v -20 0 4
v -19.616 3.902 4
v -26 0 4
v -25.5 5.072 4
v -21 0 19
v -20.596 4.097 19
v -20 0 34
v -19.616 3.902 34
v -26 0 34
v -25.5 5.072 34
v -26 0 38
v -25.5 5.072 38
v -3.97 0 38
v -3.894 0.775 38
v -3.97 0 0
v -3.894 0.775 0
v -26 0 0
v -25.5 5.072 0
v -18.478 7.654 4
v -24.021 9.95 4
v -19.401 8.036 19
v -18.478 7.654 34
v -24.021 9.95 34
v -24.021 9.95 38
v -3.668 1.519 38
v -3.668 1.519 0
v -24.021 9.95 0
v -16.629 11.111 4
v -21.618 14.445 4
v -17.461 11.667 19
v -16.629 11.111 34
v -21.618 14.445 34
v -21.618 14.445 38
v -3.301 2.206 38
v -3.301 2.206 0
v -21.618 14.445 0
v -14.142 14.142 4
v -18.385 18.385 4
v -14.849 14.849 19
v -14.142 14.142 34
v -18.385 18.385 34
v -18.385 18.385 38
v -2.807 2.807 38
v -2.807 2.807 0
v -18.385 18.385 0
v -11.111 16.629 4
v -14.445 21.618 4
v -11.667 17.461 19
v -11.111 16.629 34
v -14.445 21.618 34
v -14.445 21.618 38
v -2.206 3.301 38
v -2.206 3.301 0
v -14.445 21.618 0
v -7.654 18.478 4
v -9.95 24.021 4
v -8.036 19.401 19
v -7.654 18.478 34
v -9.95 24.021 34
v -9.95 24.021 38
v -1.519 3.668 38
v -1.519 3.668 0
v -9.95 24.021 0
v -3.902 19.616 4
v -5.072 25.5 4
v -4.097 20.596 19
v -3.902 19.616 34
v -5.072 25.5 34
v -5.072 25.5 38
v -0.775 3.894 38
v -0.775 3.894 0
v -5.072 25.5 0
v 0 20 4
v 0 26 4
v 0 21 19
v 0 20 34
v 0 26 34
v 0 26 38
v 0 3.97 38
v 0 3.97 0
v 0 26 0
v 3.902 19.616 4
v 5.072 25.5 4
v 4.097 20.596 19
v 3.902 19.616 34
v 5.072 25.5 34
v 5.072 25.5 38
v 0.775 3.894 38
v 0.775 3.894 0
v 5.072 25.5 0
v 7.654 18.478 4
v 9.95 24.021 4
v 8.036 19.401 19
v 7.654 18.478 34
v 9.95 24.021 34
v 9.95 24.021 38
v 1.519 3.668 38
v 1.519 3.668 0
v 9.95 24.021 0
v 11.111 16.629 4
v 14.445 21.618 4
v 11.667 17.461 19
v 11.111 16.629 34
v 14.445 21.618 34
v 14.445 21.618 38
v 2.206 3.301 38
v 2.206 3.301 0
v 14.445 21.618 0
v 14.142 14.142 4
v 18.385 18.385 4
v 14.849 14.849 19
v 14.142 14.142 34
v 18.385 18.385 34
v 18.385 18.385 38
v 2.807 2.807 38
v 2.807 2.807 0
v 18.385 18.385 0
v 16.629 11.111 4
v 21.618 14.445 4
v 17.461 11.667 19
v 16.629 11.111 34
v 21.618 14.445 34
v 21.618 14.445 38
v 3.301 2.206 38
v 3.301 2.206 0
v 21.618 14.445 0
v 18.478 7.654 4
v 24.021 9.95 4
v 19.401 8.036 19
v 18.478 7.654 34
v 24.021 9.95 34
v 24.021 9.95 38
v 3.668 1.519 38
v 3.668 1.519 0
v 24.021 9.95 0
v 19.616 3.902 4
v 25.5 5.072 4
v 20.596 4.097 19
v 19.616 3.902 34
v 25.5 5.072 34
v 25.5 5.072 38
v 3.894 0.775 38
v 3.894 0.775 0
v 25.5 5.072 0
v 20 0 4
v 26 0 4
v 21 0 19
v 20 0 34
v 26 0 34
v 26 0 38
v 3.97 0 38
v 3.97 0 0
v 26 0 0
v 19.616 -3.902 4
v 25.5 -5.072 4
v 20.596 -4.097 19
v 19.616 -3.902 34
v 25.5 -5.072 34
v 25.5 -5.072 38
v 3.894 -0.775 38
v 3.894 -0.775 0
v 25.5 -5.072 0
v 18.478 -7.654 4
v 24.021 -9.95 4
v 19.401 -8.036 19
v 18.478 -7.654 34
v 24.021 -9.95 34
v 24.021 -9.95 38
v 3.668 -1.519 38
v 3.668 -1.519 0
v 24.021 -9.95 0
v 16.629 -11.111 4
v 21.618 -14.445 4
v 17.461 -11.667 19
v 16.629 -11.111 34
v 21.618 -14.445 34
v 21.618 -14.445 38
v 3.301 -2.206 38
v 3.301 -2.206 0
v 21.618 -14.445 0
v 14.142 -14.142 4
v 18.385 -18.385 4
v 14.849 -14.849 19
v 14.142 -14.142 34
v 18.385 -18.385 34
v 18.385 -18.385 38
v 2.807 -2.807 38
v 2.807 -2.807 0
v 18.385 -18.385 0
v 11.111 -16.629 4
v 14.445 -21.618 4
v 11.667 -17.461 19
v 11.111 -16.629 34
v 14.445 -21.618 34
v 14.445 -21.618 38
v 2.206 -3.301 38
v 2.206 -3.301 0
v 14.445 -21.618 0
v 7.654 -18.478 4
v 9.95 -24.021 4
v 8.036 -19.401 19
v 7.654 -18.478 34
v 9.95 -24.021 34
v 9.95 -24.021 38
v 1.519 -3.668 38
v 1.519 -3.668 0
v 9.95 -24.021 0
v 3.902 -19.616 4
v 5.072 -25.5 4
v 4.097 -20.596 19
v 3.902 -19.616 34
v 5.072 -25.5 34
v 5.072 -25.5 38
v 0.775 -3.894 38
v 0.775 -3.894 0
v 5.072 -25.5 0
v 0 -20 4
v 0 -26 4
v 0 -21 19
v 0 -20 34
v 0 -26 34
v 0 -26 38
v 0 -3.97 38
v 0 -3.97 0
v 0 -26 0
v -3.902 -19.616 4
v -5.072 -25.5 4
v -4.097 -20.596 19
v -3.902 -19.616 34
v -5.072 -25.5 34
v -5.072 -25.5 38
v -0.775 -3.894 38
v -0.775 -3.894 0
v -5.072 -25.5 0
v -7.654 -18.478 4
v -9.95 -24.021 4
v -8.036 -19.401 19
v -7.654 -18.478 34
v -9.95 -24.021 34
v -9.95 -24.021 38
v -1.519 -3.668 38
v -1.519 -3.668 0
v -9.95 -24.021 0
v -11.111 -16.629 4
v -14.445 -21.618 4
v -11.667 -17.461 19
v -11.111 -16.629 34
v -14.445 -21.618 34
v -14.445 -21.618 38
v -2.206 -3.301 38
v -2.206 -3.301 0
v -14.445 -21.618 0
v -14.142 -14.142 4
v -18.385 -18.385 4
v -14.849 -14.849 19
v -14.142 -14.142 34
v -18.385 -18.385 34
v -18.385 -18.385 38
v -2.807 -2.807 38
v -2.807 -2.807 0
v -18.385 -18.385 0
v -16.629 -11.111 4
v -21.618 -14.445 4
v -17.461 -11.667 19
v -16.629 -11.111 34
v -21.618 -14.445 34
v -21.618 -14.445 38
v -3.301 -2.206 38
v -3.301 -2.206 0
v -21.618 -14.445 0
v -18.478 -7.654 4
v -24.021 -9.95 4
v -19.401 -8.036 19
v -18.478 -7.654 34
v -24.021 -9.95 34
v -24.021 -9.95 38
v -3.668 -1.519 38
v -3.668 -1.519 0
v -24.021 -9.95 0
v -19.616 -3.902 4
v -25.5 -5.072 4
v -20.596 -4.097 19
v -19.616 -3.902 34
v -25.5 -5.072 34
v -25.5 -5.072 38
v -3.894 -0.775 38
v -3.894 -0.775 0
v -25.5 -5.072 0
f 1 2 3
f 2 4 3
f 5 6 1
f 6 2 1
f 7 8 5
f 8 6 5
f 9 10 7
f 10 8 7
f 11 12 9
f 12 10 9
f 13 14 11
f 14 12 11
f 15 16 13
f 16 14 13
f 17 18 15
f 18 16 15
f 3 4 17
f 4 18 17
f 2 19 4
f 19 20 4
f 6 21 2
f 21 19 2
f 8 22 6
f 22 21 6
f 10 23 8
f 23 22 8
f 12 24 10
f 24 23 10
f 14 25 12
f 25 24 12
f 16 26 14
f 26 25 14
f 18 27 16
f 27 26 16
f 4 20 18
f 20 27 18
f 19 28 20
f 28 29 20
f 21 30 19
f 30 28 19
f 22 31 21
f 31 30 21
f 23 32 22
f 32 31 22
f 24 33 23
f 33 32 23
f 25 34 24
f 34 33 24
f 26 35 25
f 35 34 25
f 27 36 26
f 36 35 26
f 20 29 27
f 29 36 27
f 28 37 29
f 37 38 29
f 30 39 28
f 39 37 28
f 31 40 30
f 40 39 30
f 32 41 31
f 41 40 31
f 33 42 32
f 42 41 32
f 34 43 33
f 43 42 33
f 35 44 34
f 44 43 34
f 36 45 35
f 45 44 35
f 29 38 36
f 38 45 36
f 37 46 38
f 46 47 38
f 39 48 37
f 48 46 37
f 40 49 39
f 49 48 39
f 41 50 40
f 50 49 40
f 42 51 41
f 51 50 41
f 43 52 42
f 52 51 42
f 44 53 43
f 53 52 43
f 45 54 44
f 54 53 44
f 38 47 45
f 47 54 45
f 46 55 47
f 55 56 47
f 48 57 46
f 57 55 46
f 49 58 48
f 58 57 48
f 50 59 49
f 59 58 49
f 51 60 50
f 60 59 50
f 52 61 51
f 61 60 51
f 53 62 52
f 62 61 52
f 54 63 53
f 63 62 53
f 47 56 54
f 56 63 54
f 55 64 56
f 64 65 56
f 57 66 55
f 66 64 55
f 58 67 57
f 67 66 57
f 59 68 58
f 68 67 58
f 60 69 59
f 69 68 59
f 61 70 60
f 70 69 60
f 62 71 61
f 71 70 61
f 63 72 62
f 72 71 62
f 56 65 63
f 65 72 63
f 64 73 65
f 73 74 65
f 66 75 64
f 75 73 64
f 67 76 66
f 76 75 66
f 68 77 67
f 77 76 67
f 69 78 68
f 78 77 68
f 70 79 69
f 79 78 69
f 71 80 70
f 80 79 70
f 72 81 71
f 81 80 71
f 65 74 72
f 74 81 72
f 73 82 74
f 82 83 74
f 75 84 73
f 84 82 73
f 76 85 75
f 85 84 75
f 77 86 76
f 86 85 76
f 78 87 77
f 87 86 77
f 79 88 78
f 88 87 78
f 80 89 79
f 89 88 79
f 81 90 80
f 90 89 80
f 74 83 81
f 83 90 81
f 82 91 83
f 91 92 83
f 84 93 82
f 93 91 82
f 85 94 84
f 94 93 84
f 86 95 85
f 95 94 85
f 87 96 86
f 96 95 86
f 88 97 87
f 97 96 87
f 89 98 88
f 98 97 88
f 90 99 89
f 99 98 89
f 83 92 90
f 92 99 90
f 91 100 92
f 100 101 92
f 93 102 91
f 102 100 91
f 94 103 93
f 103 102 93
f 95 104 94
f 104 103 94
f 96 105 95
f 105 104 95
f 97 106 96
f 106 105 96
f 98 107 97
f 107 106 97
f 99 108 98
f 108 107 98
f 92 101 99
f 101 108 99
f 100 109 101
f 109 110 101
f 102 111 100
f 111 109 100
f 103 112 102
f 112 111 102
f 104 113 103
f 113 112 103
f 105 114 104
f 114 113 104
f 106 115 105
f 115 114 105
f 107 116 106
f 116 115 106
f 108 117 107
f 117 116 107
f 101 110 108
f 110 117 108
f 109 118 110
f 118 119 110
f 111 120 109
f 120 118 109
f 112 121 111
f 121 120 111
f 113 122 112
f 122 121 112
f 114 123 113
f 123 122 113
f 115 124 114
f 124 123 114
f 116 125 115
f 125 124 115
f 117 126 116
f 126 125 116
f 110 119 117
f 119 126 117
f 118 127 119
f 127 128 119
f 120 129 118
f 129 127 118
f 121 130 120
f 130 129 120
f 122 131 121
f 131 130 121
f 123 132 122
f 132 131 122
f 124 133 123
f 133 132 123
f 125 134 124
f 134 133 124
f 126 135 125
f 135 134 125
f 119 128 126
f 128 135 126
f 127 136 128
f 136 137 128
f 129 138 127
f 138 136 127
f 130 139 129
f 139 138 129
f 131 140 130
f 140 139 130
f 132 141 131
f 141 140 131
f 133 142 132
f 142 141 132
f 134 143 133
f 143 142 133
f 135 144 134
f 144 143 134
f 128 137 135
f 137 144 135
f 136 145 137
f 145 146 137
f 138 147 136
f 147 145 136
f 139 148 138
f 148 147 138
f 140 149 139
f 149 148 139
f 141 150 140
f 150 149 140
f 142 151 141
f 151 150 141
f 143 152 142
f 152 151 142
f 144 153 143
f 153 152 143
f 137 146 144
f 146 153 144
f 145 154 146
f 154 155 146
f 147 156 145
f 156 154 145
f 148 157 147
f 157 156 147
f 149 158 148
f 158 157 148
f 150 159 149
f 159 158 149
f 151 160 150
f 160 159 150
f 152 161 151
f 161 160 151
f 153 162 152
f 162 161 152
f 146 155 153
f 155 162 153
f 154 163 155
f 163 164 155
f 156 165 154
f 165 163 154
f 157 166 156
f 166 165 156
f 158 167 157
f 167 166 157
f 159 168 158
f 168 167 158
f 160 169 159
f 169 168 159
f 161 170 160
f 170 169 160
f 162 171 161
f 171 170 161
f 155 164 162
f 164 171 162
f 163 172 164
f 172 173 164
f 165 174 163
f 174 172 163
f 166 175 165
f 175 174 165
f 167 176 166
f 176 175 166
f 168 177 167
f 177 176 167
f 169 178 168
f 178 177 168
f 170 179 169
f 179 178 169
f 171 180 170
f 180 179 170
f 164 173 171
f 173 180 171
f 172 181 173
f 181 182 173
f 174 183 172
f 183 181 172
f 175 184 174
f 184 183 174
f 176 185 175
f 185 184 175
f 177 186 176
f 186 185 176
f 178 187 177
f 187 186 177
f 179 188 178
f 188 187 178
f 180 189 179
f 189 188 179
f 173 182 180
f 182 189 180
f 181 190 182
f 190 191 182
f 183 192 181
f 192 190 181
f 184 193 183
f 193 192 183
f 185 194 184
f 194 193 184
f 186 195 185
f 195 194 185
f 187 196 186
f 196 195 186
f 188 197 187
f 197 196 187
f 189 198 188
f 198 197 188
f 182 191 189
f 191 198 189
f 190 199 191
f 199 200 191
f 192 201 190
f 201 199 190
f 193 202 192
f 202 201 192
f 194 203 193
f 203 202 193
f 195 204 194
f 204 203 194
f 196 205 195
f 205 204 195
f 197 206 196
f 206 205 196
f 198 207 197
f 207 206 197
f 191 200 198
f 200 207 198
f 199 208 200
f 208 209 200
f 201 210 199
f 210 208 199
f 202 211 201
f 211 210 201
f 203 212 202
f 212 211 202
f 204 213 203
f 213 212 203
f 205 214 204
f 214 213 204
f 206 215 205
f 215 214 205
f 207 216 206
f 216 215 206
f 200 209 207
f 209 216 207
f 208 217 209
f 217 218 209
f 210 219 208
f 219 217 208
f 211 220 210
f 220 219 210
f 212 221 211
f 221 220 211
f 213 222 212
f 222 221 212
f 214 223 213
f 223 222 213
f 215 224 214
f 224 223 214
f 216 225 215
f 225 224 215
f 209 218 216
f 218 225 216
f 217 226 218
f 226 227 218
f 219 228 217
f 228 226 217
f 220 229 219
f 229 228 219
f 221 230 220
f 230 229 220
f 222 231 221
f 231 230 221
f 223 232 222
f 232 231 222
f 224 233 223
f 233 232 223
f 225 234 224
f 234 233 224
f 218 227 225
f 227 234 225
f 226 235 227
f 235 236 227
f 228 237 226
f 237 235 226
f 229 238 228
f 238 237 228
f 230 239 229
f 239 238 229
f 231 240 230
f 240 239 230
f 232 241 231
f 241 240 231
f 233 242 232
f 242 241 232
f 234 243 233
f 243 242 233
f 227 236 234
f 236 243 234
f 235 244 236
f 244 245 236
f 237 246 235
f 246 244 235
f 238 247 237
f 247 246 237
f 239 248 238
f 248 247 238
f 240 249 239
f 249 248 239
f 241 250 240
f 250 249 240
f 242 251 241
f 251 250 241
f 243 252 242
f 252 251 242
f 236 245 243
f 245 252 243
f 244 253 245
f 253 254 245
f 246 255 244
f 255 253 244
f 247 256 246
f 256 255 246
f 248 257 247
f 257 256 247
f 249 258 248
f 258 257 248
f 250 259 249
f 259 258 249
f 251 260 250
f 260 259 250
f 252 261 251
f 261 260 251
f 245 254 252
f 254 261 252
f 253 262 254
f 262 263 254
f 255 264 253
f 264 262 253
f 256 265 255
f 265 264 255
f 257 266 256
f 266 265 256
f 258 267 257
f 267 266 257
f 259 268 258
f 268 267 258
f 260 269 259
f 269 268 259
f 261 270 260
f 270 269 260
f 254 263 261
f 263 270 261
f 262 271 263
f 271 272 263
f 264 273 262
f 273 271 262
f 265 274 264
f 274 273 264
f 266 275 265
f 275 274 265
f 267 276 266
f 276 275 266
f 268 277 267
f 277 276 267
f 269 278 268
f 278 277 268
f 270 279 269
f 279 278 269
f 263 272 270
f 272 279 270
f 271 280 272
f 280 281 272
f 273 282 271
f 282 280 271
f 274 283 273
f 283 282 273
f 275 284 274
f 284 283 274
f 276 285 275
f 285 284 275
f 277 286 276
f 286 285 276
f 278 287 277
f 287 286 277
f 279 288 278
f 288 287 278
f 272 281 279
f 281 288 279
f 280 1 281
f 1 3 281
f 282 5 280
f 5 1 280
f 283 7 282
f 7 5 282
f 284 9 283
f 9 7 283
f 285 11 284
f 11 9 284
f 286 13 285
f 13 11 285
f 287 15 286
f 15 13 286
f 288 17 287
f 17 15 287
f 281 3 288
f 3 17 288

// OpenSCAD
$fn = 32;

// ----------------------------------------------------------------------
// Belt roller: 40 mm barrel, 38 mm wide, bore 7.94 mm
// ----------------------------------------------------------------------

// --- parameters (mm) ---
bore_d = 7.94;            // bore
barrel_d = 40;            // barrel diameter
roller_w = 38;            // roller width
flange_d = 52;            // flange diameter
flange_t = 4;             // flange thickness
hub_d = 31.94;            // hub diameter

roller_profile = [[3.97, 0], [26, 0], [26, 4], [20, 4], [21, 19], [20, 34], [26, 34], [26, 38], [3.97, 38]];

/* the profile stays clear of the axis, so the bore comes out of the revolve */
rotate_extrude() polygon(roller_profile);
